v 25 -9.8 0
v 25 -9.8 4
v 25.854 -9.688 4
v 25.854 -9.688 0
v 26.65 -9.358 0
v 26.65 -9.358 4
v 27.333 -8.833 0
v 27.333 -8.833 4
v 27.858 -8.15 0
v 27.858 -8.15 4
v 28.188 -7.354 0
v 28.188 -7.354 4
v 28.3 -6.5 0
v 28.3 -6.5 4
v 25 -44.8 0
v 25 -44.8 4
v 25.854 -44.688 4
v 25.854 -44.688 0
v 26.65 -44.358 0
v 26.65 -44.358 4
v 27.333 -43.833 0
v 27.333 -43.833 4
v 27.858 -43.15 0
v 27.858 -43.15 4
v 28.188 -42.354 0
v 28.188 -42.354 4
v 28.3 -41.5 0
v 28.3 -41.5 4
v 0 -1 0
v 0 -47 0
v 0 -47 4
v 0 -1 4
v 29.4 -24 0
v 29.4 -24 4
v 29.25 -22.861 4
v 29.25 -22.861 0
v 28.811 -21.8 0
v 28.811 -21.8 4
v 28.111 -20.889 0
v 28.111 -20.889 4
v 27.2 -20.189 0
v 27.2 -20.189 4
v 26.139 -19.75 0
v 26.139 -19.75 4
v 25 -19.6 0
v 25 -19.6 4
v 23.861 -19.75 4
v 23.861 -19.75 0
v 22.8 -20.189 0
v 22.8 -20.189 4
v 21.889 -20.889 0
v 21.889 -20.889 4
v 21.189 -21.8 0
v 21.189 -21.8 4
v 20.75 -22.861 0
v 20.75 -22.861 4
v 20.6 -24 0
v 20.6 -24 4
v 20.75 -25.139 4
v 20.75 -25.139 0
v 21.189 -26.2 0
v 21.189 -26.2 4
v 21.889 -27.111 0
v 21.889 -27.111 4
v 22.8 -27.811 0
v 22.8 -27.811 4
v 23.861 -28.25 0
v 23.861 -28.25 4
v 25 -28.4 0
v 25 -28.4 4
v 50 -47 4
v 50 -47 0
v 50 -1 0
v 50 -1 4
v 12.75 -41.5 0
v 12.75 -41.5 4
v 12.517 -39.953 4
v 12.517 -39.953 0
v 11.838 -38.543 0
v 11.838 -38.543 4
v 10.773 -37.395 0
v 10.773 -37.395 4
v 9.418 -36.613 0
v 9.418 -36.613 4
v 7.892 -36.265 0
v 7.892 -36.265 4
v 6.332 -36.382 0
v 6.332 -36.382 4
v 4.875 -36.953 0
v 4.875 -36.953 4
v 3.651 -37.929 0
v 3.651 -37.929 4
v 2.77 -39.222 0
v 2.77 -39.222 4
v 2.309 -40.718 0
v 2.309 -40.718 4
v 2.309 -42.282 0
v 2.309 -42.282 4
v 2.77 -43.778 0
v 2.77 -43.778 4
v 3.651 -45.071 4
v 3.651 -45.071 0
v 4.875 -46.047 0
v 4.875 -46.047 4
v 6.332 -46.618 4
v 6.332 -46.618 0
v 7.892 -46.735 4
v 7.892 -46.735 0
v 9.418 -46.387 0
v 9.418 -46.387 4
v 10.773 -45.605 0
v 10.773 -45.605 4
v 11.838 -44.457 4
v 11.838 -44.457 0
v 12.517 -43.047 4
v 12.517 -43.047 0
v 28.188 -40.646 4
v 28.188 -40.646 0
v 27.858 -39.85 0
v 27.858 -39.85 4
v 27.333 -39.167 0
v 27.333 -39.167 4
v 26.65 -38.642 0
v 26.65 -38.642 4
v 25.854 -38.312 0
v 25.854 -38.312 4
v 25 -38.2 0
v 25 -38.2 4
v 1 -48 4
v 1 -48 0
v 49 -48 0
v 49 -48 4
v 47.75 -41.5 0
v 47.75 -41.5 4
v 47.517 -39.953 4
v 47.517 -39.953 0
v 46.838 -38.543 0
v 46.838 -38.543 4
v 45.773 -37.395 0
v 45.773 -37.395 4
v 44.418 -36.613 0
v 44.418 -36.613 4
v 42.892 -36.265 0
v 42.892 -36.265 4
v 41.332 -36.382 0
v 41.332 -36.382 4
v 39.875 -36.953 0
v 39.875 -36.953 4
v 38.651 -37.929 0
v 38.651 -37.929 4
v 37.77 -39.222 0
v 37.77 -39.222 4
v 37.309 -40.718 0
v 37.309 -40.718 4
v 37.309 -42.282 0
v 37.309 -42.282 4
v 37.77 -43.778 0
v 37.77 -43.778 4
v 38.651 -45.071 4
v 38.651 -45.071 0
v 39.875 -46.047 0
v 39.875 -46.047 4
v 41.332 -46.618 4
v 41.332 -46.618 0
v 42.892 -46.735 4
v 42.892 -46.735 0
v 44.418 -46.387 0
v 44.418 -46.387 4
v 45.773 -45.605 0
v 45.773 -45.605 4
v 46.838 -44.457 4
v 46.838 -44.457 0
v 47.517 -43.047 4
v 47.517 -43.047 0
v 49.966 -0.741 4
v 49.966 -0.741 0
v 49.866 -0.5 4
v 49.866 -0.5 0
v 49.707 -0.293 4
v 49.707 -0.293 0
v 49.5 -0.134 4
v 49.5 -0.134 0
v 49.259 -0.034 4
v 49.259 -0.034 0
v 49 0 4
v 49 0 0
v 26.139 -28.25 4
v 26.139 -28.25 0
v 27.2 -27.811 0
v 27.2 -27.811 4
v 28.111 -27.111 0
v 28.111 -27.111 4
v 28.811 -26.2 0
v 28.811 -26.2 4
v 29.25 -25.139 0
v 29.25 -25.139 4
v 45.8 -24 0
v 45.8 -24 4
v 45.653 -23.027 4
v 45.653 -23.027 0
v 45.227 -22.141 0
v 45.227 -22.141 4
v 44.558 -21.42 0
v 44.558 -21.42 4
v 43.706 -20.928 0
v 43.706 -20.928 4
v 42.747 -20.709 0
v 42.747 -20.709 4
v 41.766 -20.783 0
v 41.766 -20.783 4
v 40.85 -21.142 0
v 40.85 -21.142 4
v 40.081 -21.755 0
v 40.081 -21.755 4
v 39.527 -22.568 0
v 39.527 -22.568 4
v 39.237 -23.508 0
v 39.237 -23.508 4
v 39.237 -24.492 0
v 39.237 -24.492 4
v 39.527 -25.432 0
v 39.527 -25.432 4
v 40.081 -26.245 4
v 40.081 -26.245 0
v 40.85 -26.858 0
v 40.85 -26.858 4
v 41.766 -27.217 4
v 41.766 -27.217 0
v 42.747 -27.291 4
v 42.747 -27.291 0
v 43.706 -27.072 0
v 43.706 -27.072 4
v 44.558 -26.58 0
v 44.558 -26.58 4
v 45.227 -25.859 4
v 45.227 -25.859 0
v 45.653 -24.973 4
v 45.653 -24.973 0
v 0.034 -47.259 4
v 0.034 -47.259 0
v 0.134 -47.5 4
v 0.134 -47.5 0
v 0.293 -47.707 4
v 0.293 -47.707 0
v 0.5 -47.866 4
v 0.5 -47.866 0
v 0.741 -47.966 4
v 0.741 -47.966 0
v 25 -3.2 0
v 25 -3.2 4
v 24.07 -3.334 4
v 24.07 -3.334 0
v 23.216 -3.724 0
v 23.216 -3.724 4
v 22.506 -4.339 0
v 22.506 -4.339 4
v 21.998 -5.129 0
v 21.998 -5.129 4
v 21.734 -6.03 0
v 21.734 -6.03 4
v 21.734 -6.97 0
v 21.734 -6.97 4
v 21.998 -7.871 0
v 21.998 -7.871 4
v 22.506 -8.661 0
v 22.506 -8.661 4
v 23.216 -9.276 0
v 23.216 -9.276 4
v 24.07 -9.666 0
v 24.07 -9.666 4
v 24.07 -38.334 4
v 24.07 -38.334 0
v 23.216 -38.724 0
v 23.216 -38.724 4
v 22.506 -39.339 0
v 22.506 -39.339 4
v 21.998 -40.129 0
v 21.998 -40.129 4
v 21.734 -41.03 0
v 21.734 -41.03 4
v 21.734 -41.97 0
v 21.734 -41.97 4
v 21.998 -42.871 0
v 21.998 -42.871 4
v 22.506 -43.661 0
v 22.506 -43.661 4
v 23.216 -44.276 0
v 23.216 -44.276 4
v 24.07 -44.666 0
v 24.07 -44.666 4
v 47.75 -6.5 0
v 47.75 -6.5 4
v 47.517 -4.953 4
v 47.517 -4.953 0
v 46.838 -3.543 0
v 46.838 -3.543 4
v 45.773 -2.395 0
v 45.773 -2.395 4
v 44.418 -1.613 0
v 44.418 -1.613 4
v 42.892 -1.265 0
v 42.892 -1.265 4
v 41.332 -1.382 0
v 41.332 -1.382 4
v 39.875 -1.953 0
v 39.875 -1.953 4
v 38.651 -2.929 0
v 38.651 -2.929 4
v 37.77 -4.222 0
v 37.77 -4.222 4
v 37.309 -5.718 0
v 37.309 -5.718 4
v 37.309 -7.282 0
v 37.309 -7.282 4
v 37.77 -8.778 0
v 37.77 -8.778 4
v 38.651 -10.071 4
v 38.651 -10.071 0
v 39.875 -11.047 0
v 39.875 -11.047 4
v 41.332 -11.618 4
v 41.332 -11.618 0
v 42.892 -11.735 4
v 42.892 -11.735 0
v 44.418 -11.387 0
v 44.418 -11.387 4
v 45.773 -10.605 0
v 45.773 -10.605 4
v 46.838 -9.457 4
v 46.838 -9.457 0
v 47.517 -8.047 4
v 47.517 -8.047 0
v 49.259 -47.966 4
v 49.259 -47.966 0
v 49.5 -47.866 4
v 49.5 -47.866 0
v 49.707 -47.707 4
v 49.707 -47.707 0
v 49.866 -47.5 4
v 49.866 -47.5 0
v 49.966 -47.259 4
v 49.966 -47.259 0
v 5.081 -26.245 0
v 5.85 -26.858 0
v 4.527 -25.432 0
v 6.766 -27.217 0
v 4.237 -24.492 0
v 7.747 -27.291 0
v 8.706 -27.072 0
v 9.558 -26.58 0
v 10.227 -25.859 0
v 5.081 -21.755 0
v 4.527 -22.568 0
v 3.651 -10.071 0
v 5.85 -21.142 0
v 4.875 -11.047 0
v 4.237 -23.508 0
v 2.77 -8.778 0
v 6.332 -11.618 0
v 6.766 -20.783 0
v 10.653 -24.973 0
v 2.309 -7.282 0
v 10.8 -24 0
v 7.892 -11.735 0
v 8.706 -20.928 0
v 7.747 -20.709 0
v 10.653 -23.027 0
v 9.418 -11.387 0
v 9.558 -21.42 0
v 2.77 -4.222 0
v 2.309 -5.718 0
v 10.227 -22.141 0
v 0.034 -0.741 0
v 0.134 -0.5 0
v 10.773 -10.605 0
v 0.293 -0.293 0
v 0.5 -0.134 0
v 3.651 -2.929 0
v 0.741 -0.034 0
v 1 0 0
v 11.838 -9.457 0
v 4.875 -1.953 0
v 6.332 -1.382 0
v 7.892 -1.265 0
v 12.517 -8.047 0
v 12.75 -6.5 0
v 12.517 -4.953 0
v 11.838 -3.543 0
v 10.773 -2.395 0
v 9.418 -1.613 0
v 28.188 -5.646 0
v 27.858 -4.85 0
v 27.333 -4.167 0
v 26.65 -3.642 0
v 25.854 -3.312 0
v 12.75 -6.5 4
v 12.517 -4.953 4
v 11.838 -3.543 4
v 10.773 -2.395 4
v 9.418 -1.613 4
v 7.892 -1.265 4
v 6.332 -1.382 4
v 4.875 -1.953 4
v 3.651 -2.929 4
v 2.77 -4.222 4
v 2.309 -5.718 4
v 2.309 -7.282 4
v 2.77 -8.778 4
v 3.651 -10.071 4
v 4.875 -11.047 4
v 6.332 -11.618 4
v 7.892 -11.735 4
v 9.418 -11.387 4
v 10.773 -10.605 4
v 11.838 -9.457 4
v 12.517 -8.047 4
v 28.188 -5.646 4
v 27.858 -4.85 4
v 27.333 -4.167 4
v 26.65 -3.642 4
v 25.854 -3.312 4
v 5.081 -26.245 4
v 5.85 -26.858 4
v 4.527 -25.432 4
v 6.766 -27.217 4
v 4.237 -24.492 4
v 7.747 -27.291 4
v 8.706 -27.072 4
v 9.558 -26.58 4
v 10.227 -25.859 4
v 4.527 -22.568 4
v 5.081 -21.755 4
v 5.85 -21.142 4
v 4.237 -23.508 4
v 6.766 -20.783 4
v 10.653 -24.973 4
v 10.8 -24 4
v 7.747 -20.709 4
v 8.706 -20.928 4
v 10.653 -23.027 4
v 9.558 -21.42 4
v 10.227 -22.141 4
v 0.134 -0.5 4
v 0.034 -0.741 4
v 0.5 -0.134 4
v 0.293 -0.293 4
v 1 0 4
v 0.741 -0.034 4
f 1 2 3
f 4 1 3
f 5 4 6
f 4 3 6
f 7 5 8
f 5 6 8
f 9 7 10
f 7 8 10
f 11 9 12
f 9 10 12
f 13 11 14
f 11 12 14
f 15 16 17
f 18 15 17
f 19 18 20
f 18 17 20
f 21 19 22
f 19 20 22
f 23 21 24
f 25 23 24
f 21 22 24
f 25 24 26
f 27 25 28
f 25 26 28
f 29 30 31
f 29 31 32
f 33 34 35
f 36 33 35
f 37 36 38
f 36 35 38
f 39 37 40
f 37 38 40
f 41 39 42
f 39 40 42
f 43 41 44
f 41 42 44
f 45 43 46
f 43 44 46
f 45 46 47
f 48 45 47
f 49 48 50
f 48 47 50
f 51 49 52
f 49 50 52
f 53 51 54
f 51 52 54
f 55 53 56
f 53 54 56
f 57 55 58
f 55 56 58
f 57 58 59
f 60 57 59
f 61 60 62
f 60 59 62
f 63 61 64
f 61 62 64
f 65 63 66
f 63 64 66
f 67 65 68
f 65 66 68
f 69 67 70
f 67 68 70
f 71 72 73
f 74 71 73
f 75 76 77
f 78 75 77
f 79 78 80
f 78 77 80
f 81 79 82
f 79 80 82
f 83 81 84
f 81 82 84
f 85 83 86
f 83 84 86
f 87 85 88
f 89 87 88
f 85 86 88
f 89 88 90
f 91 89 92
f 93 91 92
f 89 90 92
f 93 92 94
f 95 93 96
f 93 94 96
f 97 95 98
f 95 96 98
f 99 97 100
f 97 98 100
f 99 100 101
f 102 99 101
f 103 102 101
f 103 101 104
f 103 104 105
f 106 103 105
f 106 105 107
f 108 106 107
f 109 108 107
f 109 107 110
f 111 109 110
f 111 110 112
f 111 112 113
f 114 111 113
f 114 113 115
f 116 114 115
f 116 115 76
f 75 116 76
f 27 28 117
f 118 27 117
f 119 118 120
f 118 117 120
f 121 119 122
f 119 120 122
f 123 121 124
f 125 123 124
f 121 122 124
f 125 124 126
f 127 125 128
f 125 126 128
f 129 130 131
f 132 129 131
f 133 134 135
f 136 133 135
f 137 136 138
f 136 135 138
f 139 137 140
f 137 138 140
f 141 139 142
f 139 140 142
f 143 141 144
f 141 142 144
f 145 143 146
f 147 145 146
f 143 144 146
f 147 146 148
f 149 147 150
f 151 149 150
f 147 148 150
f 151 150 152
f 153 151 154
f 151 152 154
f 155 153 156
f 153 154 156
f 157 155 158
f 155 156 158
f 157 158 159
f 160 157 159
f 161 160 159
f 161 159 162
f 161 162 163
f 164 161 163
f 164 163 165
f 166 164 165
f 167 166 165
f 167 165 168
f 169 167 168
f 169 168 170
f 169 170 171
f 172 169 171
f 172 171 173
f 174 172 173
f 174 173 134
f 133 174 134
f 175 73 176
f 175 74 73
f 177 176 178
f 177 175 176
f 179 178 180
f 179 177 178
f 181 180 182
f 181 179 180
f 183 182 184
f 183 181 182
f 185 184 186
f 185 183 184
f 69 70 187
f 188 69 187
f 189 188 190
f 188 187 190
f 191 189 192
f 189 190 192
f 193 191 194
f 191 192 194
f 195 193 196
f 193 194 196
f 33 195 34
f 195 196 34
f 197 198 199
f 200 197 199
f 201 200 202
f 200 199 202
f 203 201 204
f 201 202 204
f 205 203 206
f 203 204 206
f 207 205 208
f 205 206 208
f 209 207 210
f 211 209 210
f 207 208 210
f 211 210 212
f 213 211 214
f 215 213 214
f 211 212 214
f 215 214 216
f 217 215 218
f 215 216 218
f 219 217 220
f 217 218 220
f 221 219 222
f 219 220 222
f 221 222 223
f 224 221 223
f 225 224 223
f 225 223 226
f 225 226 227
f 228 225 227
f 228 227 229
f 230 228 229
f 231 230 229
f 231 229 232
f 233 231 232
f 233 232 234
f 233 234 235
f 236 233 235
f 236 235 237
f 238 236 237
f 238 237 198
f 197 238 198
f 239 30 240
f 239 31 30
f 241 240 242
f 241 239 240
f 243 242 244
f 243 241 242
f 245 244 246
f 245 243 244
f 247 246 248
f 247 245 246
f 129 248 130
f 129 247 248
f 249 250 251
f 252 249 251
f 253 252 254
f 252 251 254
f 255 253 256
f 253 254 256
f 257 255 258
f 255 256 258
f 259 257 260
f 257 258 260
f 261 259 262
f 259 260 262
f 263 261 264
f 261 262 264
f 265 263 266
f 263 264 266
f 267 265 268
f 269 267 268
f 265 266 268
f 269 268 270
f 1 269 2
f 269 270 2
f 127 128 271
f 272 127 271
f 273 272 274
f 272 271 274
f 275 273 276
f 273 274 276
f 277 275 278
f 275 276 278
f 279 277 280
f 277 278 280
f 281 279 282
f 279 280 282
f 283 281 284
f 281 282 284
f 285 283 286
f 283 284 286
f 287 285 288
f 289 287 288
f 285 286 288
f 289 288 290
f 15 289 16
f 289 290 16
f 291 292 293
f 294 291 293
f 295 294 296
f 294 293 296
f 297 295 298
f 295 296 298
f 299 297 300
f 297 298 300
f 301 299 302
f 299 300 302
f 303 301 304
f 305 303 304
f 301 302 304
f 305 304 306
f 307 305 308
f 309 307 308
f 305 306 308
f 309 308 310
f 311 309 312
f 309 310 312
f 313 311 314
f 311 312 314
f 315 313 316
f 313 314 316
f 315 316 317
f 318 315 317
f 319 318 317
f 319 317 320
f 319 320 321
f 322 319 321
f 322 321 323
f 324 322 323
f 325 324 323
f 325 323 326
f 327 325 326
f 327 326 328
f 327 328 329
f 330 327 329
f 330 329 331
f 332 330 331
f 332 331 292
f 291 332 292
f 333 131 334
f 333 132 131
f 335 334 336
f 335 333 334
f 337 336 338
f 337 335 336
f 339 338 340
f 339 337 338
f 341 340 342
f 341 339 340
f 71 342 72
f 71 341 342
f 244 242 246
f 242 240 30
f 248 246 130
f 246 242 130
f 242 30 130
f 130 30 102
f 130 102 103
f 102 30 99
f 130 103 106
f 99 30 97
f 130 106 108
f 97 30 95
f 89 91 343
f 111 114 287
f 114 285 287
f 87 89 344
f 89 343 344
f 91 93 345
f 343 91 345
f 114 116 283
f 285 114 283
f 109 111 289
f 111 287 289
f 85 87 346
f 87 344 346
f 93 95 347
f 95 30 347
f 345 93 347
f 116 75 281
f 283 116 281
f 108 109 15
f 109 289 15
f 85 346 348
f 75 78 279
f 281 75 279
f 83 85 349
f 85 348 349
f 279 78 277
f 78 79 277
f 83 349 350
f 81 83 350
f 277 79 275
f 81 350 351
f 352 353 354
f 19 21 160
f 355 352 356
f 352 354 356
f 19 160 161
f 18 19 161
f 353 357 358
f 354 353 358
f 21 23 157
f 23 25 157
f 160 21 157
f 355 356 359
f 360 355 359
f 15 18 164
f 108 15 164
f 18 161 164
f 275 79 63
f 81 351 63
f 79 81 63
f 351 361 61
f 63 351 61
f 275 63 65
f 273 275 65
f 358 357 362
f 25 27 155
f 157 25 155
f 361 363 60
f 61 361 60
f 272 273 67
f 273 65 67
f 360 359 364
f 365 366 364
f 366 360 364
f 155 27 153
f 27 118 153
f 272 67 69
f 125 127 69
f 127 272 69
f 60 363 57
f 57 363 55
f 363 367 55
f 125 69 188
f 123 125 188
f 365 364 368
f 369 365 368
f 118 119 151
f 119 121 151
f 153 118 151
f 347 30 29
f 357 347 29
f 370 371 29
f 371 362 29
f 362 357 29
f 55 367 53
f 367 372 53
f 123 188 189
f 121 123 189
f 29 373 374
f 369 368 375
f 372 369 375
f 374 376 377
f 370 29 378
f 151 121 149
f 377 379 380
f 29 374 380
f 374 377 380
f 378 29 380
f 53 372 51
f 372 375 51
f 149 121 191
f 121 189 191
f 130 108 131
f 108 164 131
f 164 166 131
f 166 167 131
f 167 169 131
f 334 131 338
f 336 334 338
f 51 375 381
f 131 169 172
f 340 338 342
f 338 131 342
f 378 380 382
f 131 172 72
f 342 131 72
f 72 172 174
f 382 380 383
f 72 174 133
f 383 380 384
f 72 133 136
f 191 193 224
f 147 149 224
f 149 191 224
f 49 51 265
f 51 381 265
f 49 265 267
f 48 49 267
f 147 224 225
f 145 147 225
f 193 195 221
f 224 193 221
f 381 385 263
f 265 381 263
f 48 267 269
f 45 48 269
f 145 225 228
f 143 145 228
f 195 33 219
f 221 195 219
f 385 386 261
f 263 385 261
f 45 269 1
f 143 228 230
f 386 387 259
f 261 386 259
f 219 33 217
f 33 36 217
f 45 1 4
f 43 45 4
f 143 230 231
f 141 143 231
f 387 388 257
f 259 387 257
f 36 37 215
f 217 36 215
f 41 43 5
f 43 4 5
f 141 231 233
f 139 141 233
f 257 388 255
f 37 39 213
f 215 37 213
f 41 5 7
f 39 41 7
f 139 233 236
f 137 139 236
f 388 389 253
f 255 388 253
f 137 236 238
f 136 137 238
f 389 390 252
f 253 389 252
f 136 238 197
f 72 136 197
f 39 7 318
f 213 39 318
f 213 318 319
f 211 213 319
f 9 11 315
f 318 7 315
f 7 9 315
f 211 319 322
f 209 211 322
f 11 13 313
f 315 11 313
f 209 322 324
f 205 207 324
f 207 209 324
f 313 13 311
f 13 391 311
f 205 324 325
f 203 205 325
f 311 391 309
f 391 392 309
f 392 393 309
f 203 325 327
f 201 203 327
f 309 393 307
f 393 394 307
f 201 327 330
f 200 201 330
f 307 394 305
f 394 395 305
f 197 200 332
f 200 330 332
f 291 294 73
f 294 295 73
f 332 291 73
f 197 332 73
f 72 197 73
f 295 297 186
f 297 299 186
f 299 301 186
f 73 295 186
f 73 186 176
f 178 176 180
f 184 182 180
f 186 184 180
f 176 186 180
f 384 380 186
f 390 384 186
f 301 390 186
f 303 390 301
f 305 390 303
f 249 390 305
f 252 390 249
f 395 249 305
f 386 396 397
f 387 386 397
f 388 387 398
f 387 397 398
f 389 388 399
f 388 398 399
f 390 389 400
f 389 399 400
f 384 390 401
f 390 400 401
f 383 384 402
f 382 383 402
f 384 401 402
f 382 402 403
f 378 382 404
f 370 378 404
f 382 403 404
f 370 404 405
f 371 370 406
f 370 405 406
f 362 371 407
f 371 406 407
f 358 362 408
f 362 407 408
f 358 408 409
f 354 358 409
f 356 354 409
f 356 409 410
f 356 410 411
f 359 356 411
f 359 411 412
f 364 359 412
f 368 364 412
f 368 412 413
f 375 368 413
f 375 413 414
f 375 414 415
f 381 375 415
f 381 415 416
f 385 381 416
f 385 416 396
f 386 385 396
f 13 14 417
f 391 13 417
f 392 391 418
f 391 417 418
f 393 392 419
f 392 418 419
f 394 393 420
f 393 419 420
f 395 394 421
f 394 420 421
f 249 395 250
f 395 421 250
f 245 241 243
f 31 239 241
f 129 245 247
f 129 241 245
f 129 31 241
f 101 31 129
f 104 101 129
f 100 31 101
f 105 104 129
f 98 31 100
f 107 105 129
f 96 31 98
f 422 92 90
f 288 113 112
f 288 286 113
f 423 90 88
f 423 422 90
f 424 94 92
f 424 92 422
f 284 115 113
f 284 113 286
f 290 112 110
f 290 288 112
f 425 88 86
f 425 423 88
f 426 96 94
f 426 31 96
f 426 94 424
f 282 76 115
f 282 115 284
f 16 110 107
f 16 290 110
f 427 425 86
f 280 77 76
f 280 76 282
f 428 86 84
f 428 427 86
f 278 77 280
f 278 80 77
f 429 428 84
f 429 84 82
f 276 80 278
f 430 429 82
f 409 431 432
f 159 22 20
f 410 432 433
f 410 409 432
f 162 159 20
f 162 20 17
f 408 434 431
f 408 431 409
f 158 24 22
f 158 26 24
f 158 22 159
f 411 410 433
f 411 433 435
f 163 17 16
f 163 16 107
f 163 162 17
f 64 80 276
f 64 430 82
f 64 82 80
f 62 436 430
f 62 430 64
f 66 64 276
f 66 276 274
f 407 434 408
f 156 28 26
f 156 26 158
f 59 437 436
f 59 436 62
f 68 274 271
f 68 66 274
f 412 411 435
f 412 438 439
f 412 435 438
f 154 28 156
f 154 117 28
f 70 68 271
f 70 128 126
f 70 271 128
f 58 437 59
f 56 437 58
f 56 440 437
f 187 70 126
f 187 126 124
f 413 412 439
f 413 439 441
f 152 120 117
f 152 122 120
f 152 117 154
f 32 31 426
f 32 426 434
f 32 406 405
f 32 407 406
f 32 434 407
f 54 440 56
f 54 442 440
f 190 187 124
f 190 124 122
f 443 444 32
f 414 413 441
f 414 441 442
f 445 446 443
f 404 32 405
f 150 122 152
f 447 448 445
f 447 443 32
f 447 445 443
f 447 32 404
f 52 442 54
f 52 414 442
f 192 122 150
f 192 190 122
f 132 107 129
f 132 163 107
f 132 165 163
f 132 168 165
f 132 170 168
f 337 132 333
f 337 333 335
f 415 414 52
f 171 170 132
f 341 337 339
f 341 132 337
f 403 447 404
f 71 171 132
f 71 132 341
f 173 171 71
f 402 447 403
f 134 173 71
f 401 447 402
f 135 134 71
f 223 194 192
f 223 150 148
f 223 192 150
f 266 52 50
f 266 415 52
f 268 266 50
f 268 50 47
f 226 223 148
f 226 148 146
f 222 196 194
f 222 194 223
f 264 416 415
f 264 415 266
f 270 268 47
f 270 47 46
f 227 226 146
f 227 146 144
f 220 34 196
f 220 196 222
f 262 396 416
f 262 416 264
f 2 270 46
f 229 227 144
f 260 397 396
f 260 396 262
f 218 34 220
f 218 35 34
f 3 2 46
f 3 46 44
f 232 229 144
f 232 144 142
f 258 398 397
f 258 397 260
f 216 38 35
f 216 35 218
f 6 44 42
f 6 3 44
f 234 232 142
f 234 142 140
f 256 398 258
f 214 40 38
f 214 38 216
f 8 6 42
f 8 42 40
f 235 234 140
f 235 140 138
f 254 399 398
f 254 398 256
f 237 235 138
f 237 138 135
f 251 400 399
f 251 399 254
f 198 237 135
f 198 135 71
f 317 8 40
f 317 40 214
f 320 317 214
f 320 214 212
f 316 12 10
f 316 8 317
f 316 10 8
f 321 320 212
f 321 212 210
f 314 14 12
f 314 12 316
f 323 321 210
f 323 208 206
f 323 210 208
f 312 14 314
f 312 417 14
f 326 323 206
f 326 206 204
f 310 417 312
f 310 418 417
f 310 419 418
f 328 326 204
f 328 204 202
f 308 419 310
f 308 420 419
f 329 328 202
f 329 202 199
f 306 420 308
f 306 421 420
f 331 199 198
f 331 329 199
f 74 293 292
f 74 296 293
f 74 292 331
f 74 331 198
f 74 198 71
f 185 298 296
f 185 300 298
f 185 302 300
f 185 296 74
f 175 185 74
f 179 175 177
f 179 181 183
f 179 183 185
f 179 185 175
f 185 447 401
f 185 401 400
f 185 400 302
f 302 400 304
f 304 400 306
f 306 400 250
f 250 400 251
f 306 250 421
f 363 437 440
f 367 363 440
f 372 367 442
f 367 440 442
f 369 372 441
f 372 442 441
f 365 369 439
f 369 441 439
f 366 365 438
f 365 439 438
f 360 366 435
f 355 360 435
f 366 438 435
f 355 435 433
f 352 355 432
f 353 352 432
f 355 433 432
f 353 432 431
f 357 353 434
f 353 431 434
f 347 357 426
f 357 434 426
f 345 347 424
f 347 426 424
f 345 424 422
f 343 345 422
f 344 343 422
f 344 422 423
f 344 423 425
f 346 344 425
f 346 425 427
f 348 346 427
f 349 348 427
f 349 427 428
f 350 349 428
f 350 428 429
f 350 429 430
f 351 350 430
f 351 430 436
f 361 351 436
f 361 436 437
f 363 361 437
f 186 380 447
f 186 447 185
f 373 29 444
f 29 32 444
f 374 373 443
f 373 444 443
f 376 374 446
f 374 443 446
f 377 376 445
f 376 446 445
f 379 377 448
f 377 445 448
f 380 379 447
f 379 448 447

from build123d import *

# Parameters (mm, degrees)
SKETCH_1_W          = 50
SKETCH_1_H          = 48
EXTRUDE_1_DEPTH     = 4
FILLET_1_R          = 1
SKETCH_2_R          = 5.25
CUT_EXTRUDE_1_DEPTH = 70.426219831
CUT_EXTRUDE_2_DEPTH = 70.426219831


with BuildPart() as part:
    # 草图1 → 凸台-拉伸1 (new body)
    with BuildSketch(Plane.XY):
        with Locations((25, -24)):
            Rectangle(SKETCH_1_W, SKETCH_1_H)
    extrude(amount=EXTRUDE_1_DEPTH)

    # 圆角1
    fillet_1_edges = [part.edges().sort_by_distance(p)[0] for p in [
        (0, 0, 2),
        (50, 0, 2),
        (50, -48, 2),
        (0, -48, 2),
    ]]
    fillet(fillet_1_edges, radius=FILLET_1_R)

    # 草图2 → 切除-拉伸1 (cut, through all)
    with BuildSketch(Plane.XY.offset(4)):
        with Locations((7.5, -6.5)):
            Circle(SKETCH_2_R)
        with Locations((42.5, -6.5)):
            Circle(SKETCH_2_R)
        with Locations((42.5, -41.5)):
            Circle(SKETCH_2_R)
        with Locations((7.5, -41.5)):
            Circle(SKETCH_2_R)
        with BuildLine():
            Line((25, -24), (29.4, -24))
            ThreePointArc((29.4, -24), (28.111269837, -20.888730163), (25, -19.6))
            Line((25, -19.6), (25, -24))
        make_face()
        with BuildLine():
            Line((20.6, -24), (25, -24))
            Line((25, -24), (25, -19.6))
            ThreePointArc((25, -19.6), (21.888730163, -20.888730163), (20.6, -24))
        make_face()
        with BuildLine():
            ThreePointArc((25, -28.4), (28.111269837, -27.111269837), (29.4, -24))
            Line((29.4, -24), (25, -24))
            Line((25, -24), (25, -28.4))
        make_face()
        with BuildLine():
            Line((25, -28.4), (25, -24))
            Line((25, -24), (20.6, -24))
            ThreePointArc((20.6, -24), (21.888730163, -27.111269837), (25, -28.4))
        make_face()
    extrude(amount=-CUT_EXTRUDE_1_DEPTH, mode=Mode.SUBTRACT)

    # 草图9 → 切除-拉伸2 (cut, through all)
    with BuildSketch(Plane.XY.offset(4)):
        with BuildLine():
            ThreePointArc((4.2, -24), (7.5, -27.3), (10.8, -24))
            Line((10.8, -24), (4.2, -24))
        make_face()
        with BuildLine():
            Line((4.2, -24), (10.8, -24))
            ThreePointArc((10.8, -24), (7.5, -20.7), (4.2, -24))
        make_face()
        with BuildLine():
            ThreePointArc((39.2, -24), (42.5, -27.3), (45.8, -24))
            Line((45.8, -24), (39.2, -24))
        make_face()
        with BuildLine():
            Line((39.2, -24), (45.8, -24))
            ThreePointArc((45.8, -24), (42.5, -20.7), (39.2, -24))
        make_face()
        with BuildLine():
            ThreePointArc((25, -3.2), (21.7, -6.5), (25, -9.8))
            Line((25, -9.8), (25, -3.2))
        make_face()
        with BuildLine():
            Line((25, -3.2), (25, -9.8))
            ThreePointArc((25, -9.8), (27.333452378, -8.833452378), (28.3, -6.5))
            ThreePointArc((28.3, -6.5), (27.333452378, -4.166547622), (25, -3.2))
        make_face()
        with BuildLine():
            ThreePointArc((28.3, -41.5), (27.333452378, -39.166547622), (25, -38.2))
            Line((25, -38.2), (25, -44.8))
            ThreePointArc((25, -44.8), (27.333452378, -43.833452378), (28.3, -41.5))
        make_face()
        with BuildLine():
            Line((25, -44.8), (25, -38.2))
            ThreePointArc((25, -38.2), (21.7, -41.5), (25, -44.8))
        make_face()
    extrude(amount=-CUT_EXTRUDE_2_DEPTH, mode=Mode.SUBTRACT)


solid = part.part
